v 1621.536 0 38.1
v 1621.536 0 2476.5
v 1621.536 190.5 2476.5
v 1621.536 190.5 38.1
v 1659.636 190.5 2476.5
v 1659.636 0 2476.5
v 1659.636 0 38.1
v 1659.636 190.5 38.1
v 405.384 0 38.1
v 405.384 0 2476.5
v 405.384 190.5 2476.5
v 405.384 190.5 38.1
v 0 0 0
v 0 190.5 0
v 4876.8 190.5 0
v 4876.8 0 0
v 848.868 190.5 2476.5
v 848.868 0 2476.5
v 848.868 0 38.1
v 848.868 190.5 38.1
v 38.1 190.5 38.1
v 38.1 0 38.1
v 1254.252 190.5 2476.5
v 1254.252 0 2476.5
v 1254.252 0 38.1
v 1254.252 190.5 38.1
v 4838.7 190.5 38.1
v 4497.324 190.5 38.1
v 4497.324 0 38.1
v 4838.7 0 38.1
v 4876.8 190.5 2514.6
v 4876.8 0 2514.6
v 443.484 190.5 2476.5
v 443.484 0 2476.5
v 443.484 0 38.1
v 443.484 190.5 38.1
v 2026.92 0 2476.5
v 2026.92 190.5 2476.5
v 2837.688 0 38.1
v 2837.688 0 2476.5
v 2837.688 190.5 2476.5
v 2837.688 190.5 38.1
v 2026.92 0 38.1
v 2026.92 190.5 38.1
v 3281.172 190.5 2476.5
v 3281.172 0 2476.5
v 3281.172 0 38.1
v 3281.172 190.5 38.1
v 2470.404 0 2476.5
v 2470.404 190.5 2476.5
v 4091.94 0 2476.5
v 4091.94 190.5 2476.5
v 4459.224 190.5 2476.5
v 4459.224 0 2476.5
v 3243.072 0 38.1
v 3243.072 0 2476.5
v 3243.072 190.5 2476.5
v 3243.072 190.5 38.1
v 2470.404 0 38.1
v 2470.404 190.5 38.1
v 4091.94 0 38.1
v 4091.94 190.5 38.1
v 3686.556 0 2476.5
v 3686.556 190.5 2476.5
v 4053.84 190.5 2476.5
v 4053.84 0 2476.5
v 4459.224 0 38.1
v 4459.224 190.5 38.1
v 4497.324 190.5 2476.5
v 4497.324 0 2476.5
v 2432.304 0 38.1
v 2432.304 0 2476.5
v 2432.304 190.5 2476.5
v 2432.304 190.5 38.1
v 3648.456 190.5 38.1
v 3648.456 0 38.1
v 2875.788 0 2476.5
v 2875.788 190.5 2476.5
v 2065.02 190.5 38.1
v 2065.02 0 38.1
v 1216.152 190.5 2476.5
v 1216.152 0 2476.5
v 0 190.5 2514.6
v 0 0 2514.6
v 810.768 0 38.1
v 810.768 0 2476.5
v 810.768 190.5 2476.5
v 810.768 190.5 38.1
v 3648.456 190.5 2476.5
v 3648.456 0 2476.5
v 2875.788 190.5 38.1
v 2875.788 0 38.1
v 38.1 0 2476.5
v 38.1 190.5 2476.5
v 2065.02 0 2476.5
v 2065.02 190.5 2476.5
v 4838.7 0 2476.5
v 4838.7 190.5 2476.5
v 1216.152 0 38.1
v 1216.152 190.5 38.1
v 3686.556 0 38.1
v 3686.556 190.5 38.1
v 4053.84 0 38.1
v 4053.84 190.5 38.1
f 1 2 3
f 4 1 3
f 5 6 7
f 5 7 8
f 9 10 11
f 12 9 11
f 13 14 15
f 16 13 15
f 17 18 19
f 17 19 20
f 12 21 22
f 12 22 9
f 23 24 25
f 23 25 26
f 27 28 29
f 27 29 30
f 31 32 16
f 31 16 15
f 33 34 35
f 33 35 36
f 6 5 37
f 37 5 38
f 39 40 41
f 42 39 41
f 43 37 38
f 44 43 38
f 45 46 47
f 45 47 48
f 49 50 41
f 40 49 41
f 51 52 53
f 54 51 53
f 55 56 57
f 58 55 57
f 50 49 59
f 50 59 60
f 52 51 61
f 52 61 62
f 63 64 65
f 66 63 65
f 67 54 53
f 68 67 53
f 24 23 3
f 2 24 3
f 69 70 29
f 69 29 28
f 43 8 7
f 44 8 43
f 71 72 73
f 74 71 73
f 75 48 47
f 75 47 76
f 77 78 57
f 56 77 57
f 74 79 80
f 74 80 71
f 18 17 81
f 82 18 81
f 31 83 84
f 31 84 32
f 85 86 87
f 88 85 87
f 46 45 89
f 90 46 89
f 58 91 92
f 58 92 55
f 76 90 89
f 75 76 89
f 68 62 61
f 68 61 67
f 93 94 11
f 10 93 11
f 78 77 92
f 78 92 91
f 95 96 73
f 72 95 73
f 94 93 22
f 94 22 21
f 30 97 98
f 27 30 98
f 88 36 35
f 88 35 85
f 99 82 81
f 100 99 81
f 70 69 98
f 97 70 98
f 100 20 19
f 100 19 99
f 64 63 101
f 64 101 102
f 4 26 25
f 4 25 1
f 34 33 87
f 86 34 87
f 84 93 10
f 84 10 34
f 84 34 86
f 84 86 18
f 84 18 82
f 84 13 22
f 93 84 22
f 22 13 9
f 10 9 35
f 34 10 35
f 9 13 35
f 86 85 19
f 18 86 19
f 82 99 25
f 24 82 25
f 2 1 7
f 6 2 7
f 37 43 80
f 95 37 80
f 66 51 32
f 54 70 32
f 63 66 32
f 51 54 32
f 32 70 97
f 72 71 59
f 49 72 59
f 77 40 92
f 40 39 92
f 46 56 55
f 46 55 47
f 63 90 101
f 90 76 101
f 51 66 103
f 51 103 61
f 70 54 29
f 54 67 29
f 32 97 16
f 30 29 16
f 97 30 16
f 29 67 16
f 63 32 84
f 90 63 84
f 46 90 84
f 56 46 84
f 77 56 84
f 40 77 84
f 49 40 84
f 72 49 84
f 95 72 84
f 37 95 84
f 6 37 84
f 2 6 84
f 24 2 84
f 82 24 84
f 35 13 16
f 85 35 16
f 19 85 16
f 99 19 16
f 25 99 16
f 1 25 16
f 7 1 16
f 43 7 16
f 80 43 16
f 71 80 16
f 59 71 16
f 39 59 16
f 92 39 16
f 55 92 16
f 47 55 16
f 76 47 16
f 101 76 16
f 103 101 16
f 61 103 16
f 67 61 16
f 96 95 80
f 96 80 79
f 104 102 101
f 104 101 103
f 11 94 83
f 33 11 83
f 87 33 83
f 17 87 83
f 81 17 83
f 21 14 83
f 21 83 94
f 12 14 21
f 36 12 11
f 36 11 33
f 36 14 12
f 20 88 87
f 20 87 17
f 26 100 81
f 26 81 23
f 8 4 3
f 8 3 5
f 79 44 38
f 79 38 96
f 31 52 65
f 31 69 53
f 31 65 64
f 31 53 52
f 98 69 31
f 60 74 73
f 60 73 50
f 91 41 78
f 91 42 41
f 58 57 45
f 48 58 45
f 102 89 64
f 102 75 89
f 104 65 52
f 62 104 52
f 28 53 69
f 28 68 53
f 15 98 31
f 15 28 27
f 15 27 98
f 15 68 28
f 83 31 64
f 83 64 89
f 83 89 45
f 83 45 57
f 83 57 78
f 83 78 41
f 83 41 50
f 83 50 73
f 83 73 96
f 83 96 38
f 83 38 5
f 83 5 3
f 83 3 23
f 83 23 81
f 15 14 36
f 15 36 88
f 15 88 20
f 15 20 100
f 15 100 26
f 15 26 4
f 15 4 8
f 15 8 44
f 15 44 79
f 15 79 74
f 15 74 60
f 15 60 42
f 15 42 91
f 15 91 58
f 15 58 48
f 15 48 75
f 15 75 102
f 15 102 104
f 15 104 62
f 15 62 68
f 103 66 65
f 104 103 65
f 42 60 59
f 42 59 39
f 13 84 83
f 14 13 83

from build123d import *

# Parameters (mm, degrees)
F0_W     = 4876.8
F0_H     = 190.5
F1_DEPTH = 38.1
F2_W     = 38.1
F2_H     = 190.5
F3_DEPTH = 2438.4
F4_W     = 4876.8
F4_H     = 190.5
F5_DEPTH = 38.1


with BuildPart() as f1:
    # F0 (on Top) → F1 (new body)
    with BuildSketch(Plane.XY):
        with Locations((2438.4, 95.25)):
            Rectangle(F0_W, F0_H)
    extrude(amount=F1_DEPTH)

    # F2 (on face) → F3 (join)
    with BuildSketch(Plane.XY.offset(38.1)):
        with Locations((19.05, 95.25)):
            Rectangle(F2_W, F2_H)
        with Locations((424.434, 95.25)):
            Rectangle(F2_W, F2_H)
        with Locations((829.818, 95.25)):
            Rectangle(F2_W, F2_H)
        with Locations((1235.202, 95.25)):
            Rectangle(F2_W, F2_H)
        with Locations((1640.586, 95.25)):
            Rectangle(F2_W, F2_H)
        with Locations((2045.97, 95.25)):
            Rectangle(F2_W, F2_H)
        with Locations((2451.354, 95.25)):
            Rectangle(F2_W, F2_H)
        with Locations((2856.738, 95.25)):
            Rectangle(F2_W, F2_H)
        with Locations((3262.122, 95.25)):
            Rectangle(F2_W, F2_H)
        with Locations((3667.506, 95.25)):
            Rectangle(F2_W, F2_H)
        with Locations((4072.89, 95.25)):
            Rectangle(F2_W, F2_H)
        with Locations((4478.274, 95.25)):
            Rectangle(F2_W, F2_H)
        with Locations((4857.75, 95.25)):
            Rectangle(F2_W, F2_H)
    extrude(amount=F3_DEPTH)

    # F4 (on face) → F5 (join)
    with BuildSketch(Plane.XY.offset(2476.5)):
        with Locations((2438.4, 95.25)):
            Rectangle(F4_W, F4_H)
    extrude(amount=F5_DEPTH)


solid = f1.part
